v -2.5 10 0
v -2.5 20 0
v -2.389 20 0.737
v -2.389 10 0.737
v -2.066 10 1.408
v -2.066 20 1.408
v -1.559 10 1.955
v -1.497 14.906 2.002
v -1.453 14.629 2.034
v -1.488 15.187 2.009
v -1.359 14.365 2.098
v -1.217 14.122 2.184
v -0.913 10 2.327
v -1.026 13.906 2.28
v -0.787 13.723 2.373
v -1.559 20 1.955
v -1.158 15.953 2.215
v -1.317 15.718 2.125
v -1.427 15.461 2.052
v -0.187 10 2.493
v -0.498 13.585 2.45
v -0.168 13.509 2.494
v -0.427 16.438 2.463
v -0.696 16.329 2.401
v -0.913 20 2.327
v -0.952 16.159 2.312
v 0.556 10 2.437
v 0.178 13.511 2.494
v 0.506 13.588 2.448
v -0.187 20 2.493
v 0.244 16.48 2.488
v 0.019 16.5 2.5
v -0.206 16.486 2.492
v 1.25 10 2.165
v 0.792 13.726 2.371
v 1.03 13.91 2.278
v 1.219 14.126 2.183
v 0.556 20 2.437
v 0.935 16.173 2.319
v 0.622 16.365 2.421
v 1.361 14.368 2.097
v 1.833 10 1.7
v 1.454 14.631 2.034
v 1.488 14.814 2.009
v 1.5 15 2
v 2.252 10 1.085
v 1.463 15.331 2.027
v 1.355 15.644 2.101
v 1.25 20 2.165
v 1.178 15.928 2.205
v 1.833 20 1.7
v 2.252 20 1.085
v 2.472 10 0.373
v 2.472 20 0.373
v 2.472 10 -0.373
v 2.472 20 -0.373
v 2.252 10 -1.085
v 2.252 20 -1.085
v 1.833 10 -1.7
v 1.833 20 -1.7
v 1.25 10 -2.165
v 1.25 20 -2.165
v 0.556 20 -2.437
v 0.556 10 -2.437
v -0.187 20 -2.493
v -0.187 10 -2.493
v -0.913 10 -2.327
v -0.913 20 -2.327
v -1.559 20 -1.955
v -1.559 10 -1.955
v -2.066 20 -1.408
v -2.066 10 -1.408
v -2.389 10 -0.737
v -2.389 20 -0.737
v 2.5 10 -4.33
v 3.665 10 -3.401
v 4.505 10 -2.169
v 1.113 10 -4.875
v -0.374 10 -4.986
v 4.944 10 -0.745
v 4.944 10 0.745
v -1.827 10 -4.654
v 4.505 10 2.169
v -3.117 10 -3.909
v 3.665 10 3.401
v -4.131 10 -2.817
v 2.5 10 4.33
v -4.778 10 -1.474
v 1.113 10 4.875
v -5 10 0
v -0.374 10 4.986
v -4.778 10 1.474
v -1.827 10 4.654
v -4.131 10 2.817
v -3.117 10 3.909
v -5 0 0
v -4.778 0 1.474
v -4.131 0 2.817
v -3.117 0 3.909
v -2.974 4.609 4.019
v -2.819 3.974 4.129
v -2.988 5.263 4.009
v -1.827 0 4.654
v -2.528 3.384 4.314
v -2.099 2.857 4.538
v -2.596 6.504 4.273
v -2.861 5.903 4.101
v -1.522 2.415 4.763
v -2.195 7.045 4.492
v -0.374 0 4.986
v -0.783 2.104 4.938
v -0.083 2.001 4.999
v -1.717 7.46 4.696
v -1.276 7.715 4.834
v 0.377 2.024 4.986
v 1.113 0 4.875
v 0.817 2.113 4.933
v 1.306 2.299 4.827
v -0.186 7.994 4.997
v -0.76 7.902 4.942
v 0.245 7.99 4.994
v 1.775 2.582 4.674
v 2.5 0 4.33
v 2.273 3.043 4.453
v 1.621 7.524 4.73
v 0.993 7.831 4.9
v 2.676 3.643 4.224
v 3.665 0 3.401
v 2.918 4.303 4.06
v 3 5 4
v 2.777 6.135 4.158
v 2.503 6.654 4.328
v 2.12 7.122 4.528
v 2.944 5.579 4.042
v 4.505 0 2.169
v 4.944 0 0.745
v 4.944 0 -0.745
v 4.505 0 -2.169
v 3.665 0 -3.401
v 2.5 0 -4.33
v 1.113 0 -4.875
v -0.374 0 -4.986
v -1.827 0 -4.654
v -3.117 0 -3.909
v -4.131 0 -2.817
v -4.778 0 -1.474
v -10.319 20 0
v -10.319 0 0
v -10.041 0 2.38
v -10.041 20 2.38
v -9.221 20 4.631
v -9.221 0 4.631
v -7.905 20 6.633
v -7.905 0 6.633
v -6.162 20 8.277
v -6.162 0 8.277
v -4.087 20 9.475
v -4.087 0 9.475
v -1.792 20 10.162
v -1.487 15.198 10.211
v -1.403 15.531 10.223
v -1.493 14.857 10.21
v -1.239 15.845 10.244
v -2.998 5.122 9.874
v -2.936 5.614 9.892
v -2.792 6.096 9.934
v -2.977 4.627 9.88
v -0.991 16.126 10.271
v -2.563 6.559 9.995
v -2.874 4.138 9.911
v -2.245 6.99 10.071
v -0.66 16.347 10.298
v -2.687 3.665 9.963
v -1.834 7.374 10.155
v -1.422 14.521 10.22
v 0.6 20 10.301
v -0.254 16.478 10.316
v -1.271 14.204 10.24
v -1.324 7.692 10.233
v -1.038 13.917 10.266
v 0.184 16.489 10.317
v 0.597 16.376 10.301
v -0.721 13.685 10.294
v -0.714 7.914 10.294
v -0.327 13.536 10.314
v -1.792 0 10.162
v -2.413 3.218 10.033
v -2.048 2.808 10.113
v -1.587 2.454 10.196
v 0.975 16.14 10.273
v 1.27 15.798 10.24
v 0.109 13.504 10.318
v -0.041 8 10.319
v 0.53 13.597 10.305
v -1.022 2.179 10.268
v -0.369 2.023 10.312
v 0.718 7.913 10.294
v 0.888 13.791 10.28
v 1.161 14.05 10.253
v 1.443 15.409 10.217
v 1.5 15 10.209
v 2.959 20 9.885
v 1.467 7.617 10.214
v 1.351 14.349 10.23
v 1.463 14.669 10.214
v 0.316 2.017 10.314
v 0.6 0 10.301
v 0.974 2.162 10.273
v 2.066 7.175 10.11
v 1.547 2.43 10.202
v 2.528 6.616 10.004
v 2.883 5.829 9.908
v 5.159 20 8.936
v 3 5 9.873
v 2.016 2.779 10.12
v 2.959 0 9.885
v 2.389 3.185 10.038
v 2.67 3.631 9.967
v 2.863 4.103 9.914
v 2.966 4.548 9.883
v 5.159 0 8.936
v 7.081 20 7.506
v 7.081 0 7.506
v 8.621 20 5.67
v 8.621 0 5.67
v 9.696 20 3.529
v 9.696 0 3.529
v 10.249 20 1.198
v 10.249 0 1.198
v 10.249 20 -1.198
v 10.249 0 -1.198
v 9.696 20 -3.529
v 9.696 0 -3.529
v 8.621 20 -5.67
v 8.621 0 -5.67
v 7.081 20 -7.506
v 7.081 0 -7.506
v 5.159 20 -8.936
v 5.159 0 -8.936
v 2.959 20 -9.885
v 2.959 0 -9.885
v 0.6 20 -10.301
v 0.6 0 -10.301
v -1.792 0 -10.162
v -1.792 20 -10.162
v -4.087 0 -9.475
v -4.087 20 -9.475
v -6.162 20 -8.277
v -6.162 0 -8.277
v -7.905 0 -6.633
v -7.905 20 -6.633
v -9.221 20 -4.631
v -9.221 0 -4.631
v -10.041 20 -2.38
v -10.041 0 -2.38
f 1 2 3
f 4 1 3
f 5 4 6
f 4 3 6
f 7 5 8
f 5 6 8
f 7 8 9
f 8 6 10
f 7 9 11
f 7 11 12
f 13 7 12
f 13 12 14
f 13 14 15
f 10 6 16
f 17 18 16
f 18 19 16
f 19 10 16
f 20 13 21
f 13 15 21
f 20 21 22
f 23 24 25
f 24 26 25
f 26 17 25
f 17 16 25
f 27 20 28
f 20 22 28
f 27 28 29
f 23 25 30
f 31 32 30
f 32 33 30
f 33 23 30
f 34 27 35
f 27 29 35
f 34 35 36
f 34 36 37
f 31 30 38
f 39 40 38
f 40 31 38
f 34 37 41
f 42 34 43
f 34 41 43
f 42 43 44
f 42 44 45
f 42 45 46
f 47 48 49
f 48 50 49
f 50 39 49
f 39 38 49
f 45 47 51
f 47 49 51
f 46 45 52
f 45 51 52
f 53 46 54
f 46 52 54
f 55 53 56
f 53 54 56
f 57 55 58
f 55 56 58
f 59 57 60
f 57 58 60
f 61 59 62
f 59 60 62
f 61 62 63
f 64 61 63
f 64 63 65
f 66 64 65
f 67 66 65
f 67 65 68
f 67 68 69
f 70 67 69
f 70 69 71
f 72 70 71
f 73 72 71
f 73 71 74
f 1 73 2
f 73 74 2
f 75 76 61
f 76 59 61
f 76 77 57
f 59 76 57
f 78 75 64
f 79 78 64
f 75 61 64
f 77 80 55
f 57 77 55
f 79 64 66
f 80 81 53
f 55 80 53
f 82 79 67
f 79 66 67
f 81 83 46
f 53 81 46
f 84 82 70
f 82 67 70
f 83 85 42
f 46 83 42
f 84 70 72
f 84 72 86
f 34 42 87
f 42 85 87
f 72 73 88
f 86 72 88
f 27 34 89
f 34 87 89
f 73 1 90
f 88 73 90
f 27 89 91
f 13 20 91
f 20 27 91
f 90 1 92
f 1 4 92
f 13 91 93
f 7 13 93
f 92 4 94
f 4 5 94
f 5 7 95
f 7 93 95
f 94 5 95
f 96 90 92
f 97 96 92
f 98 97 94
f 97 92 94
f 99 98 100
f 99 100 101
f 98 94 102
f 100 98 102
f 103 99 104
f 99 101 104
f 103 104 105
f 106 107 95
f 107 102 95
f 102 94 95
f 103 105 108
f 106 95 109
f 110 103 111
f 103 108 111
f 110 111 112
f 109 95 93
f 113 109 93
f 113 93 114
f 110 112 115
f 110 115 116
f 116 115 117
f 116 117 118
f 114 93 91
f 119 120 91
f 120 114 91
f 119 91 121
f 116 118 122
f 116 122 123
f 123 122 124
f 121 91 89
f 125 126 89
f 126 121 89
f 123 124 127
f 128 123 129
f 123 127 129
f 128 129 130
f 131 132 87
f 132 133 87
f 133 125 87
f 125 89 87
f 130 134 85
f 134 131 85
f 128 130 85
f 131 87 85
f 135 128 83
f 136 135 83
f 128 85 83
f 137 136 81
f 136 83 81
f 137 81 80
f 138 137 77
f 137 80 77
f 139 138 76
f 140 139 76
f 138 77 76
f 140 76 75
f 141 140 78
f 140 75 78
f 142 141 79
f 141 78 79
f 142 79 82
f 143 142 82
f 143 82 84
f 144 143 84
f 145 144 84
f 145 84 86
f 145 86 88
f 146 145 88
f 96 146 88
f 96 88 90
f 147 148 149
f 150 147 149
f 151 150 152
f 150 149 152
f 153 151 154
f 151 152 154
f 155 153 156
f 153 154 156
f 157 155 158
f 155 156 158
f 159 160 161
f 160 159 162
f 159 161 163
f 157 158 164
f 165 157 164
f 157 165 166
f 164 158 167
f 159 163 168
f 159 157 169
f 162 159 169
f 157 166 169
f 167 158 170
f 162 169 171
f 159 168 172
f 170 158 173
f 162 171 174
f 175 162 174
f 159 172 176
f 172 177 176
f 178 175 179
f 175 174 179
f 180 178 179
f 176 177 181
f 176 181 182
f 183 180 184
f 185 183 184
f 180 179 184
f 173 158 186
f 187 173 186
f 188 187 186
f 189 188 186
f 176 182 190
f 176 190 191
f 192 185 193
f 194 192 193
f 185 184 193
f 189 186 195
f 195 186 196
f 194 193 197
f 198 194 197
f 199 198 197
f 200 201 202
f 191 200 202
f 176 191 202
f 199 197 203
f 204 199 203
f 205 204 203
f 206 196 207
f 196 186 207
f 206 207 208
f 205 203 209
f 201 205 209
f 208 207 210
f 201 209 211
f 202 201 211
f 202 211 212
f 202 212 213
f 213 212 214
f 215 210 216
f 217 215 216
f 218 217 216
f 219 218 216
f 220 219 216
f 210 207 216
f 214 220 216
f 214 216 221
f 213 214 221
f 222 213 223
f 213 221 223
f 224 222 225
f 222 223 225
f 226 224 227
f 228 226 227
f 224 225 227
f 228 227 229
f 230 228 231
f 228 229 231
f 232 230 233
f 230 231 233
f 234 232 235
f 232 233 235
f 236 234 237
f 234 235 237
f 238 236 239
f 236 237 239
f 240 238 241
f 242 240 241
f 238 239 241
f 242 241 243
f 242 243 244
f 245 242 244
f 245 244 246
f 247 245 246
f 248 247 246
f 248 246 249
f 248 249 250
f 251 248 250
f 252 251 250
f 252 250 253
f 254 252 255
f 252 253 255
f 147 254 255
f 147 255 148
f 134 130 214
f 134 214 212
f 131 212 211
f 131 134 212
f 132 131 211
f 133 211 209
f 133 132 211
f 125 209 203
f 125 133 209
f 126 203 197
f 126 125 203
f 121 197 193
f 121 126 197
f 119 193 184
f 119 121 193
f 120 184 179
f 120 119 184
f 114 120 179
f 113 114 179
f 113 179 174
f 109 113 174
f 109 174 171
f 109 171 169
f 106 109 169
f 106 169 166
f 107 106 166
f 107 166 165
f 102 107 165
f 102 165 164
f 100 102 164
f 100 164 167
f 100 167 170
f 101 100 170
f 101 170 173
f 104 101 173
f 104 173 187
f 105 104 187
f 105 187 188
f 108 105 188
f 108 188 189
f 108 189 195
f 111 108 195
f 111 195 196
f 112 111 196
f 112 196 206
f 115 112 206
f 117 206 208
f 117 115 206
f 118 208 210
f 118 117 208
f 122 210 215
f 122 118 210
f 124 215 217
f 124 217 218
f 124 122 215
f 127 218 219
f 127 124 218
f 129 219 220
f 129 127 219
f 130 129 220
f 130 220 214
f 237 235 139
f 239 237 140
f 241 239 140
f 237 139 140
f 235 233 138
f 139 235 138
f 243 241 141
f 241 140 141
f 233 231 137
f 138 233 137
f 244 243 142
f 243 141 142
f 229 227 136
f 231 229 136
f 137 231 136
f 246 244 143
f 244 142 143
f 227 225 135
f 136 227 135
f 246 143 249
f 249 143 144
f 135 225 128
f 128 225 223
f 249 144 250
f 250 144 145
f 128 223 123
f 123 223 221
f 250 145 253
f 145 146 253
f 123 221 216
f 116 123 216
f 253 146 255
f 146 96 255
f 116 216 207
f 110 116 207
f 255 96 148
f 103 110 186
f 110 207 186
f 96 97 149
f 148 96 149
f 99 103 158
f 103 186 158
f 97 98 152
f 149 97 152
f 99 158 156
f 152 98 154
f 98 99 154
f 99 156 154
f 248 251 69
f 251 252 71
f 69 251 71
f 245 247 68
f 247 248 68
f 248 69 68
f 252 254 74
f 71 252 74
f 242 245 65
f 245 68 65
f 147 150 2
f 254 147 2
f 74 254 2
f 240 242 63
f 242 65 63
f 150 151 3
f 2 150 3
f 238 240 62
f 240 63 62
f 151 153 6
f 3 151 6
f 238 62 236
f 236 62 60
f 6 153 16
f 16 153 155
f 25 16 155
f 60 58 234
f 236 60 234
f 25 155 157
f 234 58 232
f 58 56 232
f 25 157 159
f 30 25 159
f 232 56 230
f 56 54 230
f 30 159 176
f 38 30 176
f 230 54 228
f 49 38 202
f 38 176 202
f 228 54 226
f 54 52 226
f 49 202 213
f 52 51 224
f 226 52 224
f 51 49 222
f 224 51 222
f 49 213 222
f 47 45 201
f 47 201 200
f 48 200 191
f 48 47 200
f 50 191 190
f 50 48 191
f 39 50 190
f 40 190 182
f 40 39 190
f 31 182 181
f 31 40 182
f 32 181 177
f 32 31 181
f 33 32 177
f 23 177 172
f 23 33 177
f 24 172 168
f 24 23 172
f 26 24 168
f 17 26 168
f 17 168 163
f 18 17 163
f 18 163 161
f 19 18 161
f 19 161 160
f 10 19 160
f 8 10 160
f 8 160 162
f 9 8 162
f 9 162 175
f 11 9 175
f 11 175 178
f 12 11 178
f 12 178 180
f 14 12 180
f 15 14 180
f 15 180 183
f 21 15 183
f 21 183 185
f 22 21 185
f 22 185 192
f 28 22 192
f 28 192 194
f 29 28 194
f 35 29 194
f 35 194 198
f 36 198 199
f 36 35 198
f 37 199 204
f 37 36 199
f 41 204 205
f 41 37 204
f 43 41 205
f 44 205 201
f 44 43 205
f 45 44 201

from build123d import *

# Parameters (mm, degrees)
SKETCH2_R          = 3
SKETCH2_R_2        = 1.5
CUT_EXTRUDE1_DEPTH = 11.31875


with BuildPart() as part:
    # Sketch1 → Revolve1 (revolve)
    with BuildSketch(Plane.XY):
        Polygon((-2.5, 20), (-10.31875, 20), (-10.31875, 0), (-5, 0), (-5, 10), (-2.5, 10), align=None)
    revolve(axis=Axis((0, 0, 0), (0, 1, 0)))

    # Sketch2 → Cut-Extrude1 (cut, through all)
    with BuildSketch(Plane.XY):
        with Locations((0, 5)):
            Circle(SKETCH2_R)
        with Locations((0, 15)):
            Circle(SKETCH2_R_2)
    extrude(amount=CUT_EXTRUDE1_DEPTH, mode=Mode.SUBTRACT)


solid = part.part
